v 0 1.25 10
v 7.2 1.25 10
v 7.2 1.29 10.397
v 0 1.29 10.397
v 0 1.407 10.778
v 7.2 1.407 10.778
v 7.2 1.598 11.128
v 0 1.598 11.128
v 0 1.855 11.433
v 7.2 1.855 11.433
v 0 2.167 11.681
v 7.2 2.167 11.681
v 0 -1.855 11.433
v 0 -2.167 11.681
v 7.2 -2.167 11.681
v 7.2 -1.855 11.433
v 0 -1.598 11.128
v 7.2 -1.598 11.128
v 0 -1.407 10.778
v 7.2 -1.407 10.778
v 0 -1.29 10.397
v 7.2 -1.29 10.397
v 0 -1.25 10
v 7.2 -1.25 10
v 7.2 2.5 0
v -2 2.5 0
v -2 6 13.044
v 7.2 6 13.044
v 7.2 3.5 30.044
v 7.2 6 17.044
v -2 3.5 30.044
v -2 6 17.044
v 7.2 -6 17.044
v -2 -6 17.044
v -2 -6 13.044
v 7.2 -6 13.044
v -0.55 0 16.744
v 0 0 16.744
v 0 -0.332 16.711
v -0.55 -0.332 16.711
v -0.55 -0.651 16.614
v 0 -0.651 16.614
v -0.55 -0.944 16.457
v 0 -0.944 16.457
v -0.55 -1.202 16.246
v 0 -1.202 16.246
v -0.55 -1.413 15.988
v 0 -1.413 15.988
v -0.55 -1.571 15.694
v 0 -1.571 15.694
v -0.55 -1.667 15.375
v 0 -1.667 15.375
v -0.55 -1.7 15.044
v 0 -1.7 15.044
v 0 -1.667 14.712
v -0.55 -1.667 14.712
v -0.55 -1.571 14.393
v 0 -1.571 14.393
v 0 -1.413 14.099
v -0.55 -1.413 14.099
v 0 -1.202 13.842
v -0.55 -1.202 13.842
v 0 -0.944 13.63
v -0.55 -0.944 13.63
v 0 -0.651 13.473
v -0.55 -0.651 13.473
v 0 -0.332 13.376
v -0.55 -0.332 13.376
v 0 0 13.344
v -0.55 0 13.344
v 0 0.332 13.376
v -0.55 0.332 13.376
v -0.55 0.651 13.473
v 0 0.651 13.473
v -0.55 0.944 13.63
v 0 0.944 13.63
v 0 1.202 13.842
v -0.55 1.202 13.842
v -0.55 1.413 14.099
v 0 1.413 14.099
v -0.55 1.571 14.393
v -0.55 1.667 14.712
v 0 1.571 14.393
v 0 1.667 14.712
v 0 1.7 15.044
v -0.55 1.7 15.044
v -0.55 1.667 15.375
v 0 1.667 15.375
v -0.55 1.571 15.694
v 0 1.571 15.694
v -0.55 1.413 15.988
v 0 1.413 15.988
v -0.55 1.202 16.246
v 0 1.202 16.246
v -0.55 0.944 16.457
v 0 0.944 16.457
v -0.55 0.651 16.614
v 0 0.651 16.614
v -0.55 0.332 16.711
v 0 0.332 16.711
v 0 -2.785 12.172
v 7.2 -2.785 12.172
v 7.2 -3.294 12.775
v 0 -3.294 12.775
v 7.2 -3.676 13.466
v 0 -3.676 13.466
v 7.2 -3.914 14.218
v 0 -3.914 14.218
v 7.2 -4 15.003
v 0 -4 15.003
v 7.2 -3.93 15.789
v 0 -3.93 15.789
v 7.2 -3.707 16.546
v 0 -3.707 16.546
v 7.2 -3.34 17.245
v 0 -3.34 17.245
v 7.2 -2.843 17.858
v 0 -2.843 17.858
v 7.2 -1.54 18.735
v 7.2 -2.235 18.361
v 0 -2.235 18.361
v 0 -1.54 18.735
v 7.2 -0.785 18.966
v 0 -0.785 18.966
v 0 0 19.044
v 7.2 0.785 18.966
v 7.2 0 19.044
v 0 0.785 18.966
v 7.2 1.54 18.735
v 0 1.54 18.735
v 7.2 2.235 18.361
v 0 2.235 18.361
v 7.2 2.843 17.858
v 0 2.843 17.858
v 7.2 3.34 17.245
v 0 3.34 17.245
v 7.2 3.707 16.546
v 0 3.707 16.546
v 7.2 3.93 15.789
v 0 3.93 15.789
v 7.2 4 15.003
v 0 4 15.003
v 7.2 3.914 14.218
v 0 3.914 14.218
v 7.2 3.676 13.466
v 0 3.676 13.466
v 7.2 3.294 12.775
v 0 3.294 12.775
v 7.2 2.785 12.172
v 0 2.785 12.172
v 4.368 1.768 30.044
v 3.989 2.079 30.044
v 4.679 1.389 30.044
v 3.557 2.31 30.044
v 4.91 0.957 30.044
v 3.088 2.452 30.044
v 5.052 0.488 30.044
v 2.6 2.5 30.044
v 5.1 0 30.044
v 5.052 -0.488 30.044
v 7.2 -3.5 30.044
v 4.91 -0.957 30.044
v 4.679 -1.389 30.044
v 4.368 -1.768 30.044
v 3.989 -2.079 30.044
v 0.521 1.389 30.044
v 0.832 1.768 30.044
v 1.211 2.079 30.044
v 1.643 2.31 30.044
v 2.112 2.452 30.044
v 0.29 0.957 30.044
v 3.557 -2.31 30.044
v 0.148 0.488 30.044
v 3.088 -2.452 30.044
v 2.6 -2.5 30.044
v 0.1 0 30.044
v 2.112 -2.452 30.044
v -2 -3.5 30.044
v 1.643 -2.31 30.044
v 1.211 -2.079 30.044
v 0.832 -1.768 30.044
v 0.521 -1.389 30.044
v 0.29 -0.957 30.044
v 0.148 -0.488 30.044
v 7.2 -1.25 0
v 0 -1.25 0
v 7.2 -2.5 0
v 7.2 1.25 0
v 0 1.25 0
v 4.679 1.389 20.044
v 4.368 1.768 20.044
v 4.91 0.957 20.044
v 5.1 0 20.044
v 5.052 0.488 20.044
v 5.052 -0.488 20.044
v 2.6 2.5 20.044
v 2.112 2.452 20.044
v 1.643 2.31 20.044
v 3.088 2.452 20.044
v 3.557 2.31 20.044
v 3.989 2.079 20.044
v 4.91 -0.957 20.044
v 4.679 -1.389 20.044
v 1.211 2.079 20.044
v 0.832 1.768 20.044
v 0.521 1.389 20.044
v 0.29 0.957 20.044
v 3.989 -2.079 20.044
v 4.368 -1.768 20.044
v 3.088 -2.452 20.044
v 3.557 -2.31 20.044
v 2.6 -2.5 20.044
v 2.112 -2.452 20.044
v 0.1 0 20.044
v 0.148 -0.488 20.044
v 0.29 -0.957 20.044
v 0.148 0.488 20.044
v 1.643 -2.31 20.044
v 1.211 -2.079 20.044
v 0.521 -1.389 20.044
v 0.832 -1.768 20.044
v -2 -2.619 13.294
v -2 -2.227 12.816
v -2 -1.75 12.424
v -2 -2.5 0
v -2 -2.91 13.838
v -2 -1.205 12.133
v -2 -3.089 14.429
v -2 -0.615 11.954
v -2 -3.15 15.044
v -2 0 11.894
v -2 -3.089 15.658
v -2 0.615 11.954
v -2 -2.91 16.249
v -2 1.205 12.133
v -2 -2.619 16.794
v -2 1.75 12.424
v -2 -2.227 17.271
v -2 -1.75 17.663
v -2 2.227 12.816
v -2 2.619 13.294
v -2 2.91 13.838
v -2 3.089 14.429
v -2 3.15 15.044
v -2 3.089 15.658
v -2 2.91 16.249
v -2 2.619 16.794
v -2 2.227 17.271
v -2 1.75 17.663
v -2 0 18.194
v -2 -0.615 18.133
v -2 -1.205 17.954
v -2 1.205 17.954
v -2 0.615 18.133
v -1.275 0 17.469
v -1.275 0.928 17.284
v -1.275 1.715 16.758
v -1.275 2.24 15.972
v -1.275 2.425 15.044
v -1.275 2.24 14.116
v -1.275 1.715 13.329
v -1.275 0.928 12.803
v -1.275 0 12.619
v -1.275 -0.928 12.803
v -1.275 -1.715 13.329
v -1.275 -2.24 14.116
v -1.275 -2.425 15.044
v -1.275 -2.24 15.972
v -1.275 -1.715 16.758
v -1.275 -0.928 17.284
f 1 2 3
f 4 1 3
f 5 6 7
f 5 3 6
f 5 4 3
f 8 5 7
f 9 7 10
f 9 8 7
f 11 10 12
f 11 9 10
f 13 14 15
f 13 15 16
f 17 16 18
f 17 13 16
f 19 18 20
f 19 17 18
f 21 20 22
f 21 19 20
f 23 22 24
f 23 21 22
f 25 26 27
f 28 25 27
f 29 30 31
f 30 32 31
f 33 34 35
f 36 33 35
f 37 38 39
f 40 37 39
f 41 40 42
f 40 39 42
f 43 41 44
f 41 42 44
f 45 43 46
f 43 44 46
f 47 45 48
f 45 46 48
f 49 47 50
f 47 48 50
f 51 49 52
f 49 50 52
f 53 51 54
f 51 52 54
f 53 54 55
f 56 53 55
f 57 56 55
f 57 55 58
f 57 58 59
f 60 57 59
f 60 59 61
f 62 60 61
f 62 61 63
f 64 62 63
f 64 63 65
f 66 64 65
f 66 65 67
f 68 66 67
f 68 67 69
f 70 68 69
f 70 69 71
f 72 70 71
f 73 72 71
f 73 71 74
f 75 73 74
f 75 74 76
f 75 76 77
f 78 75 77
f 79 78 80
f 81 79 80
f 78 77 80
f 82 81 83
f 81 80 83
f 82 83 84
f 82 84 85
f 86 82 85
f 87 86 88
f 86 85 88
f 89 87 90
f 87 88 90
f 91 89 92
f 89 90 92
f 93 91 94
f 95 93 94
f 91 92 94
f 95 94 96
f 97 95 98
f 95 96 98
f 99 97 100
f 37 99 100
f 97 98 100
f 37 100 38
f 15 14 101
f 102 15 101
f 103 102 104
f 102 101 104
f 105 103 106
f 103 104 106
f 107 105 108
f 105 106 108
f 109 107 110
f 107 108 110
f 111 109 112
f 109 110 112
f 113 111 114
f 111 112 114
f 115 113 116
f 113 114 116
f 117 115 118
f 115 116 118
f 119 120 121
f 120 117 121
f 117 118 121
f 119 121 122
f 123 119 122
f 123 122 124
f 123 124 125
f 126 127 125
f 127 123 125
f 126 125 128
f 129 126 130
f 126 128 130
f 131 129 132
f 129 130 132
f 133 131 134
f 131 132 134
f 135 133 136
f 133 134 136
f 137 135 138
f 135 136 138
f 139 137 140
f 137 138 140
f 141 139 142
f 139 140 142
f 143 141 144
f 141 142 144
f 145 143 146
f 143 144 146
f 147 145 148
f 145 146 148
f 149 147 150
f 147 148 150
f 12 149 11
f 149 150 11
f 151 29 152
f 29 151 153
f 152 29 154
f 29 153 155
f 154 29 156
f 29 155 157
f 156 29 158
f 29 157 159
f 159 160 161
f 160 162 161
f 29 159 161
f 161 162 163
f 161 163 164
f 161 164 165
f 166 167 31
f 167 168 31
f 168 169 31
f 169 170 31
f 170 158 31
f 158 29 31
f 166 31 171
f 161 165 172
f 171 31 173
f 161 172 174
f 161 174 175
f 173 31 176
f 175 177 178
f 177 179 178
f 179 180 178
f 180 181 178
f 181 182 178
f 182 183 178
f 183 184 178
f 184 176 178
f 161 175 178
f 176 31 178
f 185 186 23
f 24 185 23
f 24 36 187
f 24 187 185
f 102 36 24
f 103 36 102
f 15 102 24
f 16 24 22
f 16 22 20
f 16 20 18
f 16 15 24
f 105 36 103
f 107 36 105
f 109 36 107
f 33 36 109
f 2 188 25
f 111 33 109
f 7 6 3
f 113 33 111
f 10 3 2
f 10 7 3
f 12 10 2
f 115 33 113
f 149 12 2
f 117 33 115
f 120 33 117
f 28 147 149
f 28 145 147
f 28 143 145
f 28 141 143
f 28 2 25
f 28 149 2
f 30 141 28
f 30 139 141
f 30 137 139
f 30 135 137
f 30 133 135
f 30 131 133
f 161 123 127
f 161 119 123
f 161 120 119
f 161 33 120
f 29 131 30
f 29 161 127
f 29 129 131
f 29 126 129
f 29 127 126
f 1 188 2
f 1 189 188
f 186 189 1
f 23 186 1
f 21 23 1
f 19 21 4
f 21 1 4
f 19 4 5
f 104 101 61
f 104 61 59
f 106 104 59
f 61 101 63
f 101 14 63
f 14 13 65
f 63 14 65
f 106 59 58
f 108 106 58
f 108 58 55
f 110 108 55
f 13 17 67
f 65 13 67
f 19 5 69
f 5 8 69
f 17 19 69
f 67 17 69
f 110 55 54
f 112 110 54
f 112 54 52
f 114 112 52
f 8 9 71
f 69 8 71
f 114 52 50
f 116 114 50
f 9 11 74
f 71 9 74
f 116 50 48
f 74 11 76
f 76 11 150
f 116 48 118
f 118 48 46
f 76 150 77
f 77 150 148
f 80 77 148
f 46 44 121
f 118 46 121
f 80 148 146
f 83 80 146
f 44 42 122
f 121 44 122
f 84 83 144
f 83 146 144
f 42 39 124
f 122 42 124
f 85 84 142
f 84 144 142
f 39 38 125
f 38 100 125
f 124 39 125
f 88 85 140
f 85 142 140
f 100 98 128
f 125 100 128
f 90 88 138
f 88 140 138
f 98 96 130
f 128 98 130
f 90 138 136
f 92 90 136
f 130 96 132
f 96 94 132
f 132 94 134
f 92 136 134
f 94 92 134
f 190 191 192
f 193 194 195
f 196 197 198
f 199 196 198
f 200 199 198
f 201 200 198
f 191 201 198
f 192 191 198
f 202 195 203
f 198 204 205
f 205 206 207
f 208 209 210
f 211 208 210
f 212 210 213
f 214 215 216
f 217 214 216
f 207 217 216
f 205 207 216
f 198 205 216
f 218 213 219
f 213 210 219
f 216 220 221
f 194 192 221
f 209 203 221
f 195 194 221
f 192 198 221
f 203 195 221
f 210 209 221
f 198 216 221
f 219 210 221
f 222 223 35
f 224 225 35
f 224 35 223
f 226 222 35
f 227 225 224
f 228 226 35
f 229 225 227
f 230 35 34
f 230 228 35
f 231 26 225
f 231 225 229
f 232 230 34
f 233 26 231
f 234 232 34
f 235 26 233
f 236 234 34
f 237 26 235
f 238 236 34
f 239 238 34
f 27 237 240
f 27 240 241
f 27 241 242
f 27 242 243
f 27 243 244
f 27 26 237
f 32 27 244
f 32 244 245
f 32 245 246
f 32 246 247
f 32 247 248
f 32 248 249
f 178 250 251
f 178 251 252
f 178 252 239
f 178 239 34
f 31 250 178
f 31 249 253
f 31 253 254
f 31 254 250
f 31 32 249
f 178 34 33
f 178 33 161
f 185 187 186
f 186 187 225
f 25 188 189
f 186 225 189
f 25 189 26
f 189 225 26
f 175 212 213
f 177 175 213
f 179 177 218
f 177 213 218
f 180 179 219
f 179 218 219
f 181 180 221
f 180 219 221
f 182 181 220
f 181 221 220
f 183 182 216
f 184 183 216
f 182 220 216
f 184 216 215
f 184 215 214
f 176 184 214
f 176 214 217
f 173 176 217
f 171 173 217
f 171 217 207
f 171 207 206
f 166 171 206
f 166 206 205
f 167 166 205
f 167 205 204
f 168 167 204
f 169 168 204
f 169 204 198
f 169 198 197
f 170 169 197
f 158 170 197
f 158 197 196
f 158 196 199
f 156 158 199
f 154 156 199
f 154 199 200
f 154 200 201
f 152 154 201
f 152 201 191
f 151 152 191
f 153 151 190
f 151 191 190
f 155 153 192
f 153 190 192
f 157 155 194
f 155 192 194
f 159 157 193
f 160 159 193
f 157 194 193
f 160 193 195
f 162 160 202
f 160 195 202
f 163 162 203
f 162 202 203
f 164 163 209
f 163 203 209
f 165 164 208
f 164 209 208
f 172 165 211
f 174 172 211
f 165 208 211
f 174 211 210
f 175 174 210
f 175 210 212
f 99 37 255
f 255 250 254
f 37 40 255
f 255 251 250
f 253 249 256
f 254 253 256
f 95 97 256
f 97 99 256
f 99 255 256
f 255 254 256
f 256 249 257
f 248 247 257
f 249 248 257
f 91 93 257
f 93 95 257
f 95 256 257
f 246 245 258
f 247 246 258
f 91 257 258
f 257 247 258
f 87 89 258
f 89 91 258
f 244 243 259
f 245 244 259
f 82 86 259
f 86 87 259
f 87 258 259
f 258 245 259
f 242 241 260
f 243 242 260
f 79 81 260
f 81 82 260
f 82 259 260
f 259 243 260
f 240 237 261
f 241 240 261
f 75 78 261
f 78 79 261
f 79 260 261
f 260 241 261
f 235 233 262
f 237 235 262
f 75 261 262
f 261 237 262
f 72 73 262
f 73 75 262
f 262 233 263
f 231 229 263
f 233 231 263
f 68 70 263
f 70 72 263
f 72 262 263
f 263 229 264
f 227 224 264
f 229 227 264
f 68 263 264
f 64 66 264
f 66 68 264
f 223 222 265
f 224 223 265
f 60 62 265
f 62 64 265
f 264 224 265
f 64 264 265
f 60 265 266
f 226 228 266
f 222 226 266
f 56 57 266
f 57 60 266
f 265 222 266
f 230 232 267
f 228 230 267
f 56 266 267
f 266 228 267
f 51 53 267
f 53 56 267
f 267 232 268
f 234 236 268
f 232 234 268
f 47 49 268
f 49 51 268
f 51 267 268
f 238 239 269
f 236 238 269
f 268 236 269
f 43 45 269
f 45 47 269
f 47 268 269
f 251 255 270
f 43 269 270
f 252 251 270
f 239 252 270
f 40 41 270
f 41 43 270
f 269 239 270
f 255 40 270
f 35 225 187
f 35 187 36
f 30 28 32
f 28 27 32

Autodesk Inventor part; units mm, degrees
ref_plane "YZ Plane" through (0, 0, 0) normal (1, 0, 0) x (0, 1, 0)
ref_plane "XZ Plane" through (0, 0, 0) normal (0, 1, 0) x (-1, 0, 0)
ref_plane "XY Plane" through (0, 0, 0) normal (0, 0, 1) x (1, 0, 0)
sketch "Sketch1" plane through (0, 0, 0) normal (1, 0, 0) x (0, 1, 0)
  line L0 (0, 0) -> (0, 15.0436) construction
  line L1 (-1.25, 0) -> (-1.25, 10)
  line L2 (1.25, 0) -> (1.25, 10)
  circle A0 centre (0, 15.0436) radius 2
  arc A1 (2.1667, 11.6812) -> (-2.1667, 11.6812) centre (0, 15.0436) ccw
  arc A2 (-1.25, 10) -> (-2.1667, 11.6812) centre (-3.25, 10) ccw
  arc A3 (2.1667, 11.6812) -> (1.25, 10) centre (3.25, 10) ccw
  line L3 (2.5, 20.0436) -> (-2.5, 20.0436) construction
  line L4 (-2.5, 20.0436) -> (-2.5, 30.0436) construction
  line L5 (-2.5, 30.0436) -> (2.5, 30.0436) construction
  line L6 (2.5, 30.0436) -> (2.5, 20.0436) construction
  line L7 (-6, 0) -> (6, 0)
  line L8 (6, 0) -> (6, 30.0436)
  line L9 (6, 30.0436) -> (-6, 30.0436)
  line L10 (-6, 30.0436) -> (-6, 0)
  line L11 (2.5, 0) -> (6, 13.0436)
  line L12 (6, 17.0436) -> (3.5, 30.0436)
  line L13 (6, 13.0436) -> (-6.1446, 13.0436) construction
  line L14 (6, 17.0436) -> (-6.1446, 17.0436) construction
  line L15 (-2.5, 0) -> (-6, 13.0436)
  line L16 (-6, 17.0436) -> (-3.5, 30.0436)
  point P0 (0, 20.0436)
  dimension "d0" = 2.5
  dimension "d1" = 4
  dimension "d2" = 2
  dimension "d3" = 2
  dimension "d4" = 10
  dimension "d5" = 10
  dimension "d6" = 5
  dimension "d7" = 1
  dimension "d8" = 2
  dimension "d9" = 2
  dimension "d10" = 7
extrude "Extrusion1" add sketch "Sketch1" along normal blind 7.2 contours L7 L15 L10 L16 L9 L12 L8 L11 L2 A3 A1 A2 L1
sketch "Sketch2" plane through (0, 0, 0) normal (-1, 0, 0) x (0, 0, 1)
  line L0 (0, -2.5) -> (0, -1.25) projected
  line L1 (0, 1.25) -> (0, 2.5) projected
  line L2 (0, 2.5) -> (13.0436, 6) projected
  line L3 (13.0436, 6) -> (17.0436, 6) projected
  line L4 (17.0436, 6) -> (30.0436, 3.5) projected
  line L5 (30.0436, 3.5) -> (30.0436, -3.5) projected
  line L6 (30.0436, -3.5) -> (17.0436, -6) projected
  line L7 (17.0436, -6) -> (13.0436, -6) projected
  line L8 (13.0436, -6) -> (0, -2.5) projected
  line L9 (0, -2.5) -> (0, -1.25) projected
  line L10 (0, 1.25) -> (0, -1.25)
  point P0 (0, 0)
extrude "Extrusion2" add sketch "Sketch2" along normal blind 2
sketch "Sketch3" plane through (-2, 0, 0) normal (-1, 0, 0) x (0, 0, 1)
  arc A0 (11.6812, -2.1667) -> (11.6812, 2.1667) centre (15.0436, 0) ccw projected
  point P0 (0, 0)
hole "Hole1" at (-2, 0, 15.0436) direction (1, 0, 0) diameter 3.4 end through all countersink diameter 6.3 countersink angle 90 clearance for "Countersunk Flat Head Screw DIN EN ISO 2009" size "M3" standard "DIN"
sketch "Sketch4" plane through (7.2, -3.5, 30.0436) normal (0, 0, 1) x (1, 0, 0)
  line L0 (-9.2, 0) -> (0, 0) construction
  line L1 (0, 7) -> (0, 0) construction
  line L2 (-9.2, 7) -> (0, 7) construction
  line L3 (-9.2, 0) -> (-9.2, 7) construction
  line L4 (0, 7) -> (-9.2, 0) construction
  line L5 (-9.2, 7) -> (0, 0) construction
  point P0 (-7.2, 3.5)
  point P1 (-4.6, 3.5)
hole "Hole2" at (2.6, 0, 30.0436) direction (0, 0, -1) diameter 5 depth 10
equation "\"d9\" = d8"
properties part number "BeltClampM5"
